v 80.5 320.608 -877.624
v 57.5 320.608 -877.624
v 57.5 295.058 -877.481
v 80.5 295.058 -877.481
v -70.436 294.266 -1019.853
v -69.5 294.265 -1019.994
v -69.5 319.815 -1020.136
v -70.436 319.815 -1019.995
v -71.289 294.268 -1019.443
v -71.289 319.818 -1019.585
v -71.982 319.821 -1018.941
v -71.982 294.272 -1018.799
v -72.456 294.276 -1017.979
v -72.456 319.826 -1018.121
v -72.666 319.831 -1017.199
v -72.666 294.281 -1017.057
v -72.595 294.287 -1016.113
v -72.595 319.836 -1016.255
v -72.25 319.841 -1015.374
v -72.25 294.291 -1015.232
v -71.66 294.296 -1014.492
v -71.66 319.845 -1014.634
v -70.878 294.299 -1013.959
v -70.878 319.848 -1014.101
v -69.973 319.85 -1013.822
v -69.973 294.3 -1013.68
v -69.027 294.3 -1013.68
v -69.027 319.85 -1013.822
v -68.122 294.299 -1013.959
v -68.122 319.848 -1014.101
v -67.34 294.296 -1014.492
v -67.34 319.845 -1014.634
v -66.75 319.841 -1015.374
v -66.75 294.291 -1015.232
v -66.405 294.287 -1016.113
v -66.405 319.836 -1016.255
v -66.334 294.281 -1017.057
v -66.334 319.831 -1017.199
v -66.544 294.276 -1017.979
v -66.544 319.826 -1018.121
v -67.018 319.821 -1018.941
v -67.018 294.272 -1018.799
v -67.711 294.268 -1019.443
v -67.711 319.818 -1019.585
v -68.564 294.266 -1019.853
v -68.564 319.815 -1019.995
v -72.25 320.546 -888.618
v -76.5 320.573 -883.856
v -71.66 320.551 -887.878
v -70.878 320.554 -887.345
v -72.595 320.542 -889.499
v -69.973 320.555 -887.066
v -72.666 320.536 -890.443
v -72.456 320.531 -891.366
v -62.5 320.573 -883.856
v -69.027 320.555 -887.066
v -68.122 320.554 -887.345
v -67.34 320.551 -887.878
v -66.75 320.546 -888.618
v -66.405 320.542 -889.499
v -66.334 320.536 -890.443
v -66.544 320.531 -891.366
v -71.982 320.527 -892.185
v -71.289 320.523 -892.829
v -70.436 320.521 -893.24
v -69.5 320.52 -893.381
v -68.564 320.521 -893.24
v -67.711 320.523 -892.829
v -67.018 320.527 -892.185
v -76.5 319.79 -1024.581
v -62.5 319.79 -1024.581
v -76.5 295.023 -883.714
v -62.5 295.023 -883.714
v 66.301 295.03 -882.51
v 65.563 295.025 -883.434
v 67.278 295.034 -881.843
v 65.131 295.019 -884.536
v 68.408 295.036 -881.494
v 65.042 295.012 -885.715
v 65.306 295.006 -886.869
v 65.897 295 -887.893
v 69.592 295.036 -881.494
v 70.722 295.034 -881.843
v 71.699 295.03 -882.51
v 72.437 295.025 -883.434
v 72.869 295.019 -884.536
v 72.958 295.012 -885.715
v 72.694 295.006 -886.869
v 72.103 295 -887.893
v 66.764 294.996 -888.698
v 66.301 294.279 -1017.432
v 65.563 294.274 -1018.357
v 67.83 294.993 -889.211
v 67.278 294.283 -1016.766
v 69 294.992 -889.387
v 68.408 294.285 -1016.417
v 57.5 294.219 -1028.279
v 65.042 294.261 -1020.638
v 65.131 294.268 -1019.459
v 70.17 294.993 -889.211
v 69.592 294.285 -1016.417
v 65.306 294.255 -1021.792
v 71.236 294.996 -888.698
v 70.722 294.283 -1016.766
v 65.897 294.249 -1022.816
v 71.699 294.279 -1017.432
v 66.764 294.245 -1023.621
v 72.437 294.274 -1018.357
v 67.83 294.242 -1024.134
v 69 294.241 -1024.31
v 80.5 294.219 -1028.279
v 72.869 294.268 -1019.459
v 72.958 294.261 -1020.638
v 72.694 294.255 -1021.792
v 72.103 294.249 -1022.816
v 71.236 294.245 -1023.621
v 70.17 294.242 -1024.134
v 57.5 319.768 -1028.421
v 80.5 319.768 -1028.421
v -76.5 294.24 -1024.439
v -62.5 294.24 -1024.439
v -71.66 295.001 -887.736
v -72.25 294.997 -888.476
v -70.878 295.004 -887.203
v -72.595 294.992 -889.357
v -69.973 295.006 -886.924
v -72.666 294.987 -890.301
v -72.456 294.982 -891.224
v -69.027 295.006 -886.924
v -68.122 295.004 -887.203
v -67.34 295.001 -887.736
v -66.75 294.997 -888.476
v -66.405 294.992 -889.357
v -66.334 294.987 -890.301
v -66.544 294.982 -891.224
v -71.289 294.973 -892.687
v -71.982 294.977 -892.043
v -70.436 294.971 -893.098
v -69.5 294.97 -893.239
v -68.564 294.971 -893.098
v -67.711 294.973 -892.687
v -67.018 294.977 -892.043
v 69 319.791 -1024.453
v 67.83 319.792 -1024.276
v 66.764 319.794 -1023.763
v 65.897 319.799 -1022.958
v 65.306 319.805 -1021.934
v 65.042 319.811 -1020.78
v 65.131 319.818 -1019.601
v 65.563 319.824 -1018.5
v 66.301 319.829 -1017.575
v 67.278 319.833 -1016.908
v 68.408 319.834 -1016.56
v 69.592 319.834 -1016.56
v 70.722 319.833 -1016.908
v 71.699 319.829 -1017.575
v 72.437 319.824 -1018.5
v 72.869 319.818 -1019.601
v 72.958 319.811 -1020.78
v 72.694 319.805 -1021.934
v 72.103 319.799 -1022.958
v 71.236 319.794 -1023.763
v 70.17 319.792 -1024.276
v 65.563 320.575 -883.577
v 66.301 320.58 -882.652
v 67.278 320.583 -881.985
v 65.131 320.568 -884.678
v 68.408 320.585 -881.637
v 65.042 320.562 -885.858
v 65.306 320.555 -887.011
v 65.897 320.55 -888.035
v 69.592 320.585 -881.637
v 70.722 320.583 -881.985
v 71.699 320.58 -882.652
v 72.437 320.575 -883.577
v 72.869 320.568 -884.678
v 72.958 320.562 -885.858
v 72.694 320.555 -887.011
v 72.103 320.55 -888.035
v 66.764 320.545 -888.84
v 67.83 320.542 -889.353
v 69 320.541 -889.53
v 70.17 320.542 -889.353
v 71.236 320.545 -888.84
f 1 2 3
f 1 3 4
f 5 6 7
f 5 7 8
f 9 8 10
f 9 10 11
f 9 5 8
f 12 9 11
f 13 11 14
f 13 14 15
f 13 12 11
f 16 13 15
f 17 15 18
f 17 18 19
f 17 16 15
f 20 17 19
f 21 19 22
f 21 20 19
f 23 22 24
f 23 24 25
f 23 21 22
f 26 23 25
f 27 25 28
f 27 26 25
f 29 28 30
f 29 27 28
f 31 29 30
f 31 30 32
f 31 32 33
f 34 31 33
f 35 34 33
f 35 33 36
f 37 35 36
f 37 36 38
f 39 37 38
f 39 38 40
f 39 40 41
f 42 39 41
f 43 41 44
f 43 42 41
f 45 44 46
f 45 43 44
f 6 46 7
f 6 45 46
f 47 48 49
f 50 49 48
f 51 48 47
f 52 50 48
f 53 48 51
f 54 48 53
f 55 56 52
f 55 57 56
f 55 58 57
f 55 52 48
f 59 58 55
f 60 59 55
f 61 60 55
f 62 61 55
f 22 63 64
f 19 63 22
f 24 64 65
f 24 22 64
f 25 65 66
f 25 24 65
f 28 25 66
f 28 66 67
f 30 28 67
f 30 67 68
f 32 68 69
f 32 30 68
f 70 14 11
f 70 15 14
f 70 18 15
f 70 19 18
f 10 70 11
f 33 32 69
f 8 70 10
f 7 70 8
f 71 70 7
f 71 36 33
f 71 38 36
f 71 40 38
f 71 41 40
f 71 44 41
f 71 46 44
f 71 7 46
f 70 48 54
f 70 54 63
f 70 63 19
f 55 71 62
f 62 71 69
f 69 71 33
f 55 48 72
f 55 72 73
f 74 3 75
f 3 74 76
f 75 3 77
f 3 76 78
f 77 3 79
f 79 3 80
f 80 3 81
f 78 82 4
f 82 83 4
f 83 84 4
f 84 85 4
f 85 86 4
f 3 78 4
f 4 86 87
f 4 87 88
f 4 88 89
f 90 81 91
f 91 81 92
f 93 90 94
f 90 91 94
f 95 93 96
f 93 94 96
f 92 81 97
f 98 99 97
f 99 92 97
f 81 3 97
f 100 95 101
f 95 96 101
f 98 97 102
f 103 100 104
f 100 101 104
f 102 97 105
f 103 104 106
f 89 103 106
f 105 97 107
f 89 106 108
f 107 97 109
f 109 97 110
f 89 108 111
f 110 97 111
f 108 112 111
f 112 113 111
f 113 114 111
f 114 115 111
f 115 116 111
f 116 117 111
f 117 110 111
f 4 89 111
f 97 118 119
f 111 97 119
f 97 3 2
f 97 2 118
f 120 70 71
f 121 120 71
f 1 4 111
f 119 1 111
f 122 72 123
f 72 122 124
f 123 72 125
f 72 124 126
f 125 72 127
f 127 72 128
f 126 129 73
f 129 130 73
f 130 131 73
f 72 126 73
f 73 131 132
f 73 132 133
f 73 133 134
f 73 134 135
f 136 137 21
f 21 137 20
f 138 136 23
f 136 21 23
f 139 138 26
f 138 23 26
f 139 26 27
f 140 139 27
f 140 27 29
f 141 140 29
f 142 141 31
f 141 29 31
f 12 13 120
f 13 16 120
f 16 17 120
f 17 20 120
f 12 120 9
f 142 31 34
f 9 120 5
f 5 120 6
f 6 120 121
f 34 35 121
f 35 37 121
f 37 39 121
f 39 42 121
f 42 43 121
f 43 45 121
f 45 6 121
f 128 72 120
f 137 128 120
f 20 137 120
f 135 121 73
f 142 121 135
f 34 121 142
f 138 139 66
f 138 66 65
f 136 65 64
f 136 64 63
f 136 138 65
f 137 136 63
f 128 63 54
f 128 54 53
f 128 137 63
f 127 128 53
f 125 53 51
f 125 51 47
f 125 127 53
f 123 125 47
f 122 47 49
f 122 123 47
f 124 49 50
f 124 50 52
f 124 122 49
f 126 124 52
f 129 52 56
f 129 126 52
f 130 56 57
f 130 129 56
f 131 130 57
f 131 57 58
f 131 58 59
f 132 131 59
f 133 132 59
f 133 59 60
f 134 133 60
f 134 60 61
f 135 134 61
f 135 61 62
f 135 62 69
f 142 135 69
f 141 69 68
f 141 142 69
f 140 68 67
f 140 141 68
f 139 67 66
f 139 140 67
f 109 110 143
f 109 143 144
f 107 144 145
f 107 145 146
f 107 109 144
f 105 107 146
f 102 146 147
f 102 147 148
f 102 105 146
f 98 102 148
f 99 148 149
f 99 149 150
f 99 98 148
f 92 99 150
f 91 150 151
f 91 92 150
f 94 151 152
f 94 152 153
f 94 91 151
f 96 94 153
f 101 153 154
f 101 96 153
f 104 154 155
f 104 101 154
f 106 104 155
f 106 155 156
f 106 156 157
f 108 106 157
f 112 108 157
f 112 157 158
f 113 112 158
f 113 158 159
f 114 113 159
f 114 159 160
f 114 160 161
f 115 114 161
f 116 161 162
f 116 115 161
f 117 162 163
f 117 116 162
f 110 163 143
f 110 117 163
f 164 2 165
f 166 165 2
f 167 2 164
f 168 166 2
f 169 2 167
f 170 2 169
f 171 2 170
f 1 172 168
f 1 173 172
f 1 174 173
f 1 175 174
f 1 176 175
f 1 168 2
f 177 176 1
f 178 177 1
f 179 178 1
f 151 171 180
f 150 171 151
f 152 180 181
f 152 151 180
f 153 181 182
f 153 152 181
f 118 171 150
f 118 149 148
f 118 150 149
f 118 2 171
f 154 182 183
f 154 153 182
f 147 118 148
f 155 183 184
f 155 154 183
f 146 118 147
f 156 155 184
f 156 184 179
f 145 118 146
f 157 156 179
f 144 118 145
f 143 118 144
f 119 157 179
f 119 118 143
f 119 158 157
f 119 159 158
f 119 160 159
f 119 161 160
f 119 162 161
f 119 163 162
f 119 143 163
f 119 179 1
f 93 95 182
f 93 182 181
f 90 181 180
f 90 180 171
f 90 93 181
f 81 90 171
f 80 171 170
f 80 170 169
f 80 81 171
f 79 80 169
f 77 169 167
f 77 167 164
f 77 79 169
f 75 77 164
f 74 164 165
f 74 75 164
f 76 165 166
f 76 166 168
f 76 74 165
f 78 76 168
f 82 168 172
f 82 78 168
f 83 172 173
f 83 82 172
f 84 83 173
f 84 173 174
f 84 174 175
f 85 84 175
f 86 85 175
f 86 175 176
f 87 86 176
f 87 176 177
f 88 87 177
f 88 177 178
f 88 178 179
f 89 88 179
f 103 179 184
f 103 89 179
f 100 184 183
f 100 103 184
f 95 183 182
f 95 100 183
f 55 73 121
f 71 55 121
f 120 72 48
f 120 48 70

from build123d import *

# Parameters (mm, degrees)
SKETCH1_W             = 23
SKETCH1_H             = 150.8
SKETCH1_R             = 3.96875
BOSS_EXTRUDE1_DEPTH   = 25.55
SKETCH1_W_2           = 14
SKETCH1_H_2           = 140.727572026
SKETCH1_R_2           = 3.175
BOSS_EXTRUDE1_2_DEPTH = 25.55


with BuildPart() as part:
    # Sketch1 → Boss-Extrude1 (new body)
    with BuildSketch(Plane(origin=(0, 299.932186835, -1.669195554), x_dir=(1, 0, 0), z_dir=(0, 0.9999845143939402, -0.005565156989320752))):
        with Locations((69, 951.225787333)):
            Rectangle(SKETCH1_W, SKETCH1_H)
        with Locations(Location((69, 883.763287333, 0), (0, 0, 90))):
            Circle(SKETCH1_R, mode=Mode.SUBTRACT)
        with Locations(Location((69, 1018.688287333, 0), (0, 0, 90))):
            Circle(SKETCH1_R, mode=Mode.SUBTRACT)
    extrude(amount=BOSS_EXTRUDE1_DEPTH)


with BuildPart() as body_2:
    # Sketch1 → Boss-Extrude1 2 (new body)
    with BuildSketch(Plane(origin=(0, 299.932186835, -1.669195554), x_dir=(1, 0, 0), z_dir=(0, 0.9999845143939402, -0.005565156989320752))):
        with Locations((-69.5, 952.42200132)):
            Rectangle(SKETCH1_W_2, SKETCH1_H_2)
        with Locations(Location((-69.5, 1015.165787333, 0), (0, 0, 90))):
            Circle(SKETCH1_R_2, mode=Mode.SUBTRACT)
        with Locations(Location((-69.5, 888.408215307, 0), (0, 0, 90))):
            Circle(SKETCH1_R_2, mode=Mode.SUBTRACT)
    extrude(amount=BOSS_EXTRUDE1_2_DEPTH)


solid = Compound([part.part, body_2.part])
